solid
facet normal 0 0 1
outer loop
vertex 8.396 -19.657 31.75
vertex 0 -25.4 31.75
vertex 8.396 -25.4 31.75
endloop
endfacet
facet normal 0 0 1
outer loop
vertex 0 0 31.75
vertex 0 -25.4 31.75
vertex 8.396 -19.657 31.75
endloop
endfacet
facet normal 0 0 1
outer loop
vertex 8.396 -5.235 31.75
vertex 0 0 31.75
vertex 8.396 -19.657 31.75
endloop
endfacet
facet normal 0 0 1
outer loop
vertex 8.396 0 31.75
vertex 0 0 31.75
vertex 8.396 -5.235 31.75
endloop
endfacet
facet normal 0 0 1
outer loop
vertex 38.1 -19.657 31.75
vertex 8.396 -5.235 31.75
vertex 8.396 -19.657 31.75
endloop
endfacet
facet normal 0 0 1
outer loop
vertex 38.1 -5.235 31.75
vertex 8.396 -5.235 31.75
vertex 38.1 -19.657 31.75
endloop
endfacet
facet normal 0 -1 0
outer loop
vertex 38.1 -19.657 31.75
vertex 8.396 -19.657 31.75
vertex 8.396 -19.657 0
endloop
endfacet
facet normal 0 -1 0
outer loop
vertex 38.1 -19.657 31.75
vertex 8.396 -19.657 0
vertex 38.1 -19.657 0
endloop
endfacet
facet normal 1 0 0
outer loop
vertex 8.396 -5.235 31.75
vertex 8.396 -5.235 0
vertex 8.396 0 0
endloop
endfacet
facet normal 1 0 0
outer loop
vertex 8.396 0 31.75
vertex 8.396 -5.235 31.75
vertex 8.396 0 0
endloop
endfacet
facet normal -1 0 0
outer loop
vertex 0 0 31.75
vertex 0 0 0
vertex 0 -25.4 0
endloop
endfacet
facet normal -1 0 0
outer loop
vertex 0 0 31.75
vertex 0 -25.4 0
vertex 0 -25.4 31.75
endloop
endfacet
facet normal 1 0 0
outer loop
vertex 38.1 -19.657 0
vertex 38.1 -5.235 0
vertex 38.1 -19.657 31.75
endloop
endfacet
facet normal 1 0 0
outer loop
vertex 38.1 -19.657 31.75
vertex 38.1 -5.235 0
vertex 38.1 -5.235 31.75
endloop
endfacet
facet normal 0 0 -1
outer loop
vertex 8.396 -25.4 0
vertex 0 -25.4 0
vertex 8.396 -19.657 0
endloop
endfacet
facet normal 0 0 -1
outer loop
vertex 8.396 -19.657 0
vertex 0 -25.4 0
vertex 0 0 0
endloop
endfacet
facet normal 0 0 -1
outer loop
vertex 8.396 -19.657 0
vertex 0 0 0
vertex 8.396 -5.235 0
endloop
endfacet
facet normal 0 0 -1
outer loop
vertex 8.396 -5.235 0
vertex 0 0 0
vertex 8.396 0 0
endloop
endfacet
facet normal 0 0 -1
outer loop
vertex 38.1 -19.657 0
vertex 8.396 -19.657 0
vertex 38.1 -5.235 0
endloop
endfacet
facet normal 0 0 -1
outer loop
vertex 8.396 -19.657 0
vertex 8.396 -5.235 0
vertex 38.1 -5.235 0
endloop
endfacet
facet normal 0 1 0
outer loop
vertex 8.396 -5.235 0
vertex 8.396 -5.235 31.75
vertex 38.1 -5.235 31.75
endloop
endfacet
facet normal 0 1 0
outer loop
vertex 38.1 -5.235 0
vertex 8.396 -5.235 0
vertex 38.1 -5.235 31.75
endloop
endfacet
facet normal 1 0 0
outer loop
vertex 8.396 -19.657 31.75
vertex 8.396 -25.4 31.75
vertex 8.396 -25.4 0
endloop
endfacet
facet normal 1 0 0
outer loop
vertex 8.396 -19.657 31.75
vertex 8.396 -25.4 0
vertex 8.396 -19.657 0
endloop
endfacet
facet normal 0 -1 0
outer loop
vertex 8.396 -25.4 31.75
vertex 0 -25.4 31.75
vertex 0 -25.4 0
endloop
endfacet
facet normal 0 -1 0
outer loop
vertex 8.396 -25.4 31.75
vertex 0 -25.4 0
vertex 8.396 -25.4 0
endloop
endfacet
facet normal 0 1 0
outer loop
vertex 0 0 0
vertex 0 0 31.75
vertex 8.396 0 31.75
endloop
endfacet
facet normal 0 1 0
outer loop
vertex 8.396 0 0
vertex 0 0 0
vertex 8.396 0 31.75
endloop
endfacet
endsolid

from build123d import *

# Parameters (mm, degrees)
F0_W     = 38.1
F0_H     = 31.75
F1_DEPTH = 25.4
F2_W     = 29.7038885713
F2_H     = 5.2352226339
F2_H_2   = 5.7432226181
F3_DEPTH = 31.751


with BuildPart() as f1:
    # F0 (on Front) → F1 (new body)
    with BuildSketch(Plane.XZ):
        with Locations((19.05, 15.875)):
            Rectangle(F0_W, F0_H)
    extrude(amount=F1_DEPTH)

    # F2 (on face) → F3 (cut, through all)
    with BuildSketch(Plane.XY.offset(31.75)):
        with Locations((23.2480557144, -2.617611317)):
            Rectangle(F2_W, F2_H)
        with Locations((23.2480557144, -22.5283886909)):
            Rectangle(F2_W, F2_H_2)
    extrude(amount=-F3_DEPTH, mode=Mode.SUBTRACT)


solid = f1.part
